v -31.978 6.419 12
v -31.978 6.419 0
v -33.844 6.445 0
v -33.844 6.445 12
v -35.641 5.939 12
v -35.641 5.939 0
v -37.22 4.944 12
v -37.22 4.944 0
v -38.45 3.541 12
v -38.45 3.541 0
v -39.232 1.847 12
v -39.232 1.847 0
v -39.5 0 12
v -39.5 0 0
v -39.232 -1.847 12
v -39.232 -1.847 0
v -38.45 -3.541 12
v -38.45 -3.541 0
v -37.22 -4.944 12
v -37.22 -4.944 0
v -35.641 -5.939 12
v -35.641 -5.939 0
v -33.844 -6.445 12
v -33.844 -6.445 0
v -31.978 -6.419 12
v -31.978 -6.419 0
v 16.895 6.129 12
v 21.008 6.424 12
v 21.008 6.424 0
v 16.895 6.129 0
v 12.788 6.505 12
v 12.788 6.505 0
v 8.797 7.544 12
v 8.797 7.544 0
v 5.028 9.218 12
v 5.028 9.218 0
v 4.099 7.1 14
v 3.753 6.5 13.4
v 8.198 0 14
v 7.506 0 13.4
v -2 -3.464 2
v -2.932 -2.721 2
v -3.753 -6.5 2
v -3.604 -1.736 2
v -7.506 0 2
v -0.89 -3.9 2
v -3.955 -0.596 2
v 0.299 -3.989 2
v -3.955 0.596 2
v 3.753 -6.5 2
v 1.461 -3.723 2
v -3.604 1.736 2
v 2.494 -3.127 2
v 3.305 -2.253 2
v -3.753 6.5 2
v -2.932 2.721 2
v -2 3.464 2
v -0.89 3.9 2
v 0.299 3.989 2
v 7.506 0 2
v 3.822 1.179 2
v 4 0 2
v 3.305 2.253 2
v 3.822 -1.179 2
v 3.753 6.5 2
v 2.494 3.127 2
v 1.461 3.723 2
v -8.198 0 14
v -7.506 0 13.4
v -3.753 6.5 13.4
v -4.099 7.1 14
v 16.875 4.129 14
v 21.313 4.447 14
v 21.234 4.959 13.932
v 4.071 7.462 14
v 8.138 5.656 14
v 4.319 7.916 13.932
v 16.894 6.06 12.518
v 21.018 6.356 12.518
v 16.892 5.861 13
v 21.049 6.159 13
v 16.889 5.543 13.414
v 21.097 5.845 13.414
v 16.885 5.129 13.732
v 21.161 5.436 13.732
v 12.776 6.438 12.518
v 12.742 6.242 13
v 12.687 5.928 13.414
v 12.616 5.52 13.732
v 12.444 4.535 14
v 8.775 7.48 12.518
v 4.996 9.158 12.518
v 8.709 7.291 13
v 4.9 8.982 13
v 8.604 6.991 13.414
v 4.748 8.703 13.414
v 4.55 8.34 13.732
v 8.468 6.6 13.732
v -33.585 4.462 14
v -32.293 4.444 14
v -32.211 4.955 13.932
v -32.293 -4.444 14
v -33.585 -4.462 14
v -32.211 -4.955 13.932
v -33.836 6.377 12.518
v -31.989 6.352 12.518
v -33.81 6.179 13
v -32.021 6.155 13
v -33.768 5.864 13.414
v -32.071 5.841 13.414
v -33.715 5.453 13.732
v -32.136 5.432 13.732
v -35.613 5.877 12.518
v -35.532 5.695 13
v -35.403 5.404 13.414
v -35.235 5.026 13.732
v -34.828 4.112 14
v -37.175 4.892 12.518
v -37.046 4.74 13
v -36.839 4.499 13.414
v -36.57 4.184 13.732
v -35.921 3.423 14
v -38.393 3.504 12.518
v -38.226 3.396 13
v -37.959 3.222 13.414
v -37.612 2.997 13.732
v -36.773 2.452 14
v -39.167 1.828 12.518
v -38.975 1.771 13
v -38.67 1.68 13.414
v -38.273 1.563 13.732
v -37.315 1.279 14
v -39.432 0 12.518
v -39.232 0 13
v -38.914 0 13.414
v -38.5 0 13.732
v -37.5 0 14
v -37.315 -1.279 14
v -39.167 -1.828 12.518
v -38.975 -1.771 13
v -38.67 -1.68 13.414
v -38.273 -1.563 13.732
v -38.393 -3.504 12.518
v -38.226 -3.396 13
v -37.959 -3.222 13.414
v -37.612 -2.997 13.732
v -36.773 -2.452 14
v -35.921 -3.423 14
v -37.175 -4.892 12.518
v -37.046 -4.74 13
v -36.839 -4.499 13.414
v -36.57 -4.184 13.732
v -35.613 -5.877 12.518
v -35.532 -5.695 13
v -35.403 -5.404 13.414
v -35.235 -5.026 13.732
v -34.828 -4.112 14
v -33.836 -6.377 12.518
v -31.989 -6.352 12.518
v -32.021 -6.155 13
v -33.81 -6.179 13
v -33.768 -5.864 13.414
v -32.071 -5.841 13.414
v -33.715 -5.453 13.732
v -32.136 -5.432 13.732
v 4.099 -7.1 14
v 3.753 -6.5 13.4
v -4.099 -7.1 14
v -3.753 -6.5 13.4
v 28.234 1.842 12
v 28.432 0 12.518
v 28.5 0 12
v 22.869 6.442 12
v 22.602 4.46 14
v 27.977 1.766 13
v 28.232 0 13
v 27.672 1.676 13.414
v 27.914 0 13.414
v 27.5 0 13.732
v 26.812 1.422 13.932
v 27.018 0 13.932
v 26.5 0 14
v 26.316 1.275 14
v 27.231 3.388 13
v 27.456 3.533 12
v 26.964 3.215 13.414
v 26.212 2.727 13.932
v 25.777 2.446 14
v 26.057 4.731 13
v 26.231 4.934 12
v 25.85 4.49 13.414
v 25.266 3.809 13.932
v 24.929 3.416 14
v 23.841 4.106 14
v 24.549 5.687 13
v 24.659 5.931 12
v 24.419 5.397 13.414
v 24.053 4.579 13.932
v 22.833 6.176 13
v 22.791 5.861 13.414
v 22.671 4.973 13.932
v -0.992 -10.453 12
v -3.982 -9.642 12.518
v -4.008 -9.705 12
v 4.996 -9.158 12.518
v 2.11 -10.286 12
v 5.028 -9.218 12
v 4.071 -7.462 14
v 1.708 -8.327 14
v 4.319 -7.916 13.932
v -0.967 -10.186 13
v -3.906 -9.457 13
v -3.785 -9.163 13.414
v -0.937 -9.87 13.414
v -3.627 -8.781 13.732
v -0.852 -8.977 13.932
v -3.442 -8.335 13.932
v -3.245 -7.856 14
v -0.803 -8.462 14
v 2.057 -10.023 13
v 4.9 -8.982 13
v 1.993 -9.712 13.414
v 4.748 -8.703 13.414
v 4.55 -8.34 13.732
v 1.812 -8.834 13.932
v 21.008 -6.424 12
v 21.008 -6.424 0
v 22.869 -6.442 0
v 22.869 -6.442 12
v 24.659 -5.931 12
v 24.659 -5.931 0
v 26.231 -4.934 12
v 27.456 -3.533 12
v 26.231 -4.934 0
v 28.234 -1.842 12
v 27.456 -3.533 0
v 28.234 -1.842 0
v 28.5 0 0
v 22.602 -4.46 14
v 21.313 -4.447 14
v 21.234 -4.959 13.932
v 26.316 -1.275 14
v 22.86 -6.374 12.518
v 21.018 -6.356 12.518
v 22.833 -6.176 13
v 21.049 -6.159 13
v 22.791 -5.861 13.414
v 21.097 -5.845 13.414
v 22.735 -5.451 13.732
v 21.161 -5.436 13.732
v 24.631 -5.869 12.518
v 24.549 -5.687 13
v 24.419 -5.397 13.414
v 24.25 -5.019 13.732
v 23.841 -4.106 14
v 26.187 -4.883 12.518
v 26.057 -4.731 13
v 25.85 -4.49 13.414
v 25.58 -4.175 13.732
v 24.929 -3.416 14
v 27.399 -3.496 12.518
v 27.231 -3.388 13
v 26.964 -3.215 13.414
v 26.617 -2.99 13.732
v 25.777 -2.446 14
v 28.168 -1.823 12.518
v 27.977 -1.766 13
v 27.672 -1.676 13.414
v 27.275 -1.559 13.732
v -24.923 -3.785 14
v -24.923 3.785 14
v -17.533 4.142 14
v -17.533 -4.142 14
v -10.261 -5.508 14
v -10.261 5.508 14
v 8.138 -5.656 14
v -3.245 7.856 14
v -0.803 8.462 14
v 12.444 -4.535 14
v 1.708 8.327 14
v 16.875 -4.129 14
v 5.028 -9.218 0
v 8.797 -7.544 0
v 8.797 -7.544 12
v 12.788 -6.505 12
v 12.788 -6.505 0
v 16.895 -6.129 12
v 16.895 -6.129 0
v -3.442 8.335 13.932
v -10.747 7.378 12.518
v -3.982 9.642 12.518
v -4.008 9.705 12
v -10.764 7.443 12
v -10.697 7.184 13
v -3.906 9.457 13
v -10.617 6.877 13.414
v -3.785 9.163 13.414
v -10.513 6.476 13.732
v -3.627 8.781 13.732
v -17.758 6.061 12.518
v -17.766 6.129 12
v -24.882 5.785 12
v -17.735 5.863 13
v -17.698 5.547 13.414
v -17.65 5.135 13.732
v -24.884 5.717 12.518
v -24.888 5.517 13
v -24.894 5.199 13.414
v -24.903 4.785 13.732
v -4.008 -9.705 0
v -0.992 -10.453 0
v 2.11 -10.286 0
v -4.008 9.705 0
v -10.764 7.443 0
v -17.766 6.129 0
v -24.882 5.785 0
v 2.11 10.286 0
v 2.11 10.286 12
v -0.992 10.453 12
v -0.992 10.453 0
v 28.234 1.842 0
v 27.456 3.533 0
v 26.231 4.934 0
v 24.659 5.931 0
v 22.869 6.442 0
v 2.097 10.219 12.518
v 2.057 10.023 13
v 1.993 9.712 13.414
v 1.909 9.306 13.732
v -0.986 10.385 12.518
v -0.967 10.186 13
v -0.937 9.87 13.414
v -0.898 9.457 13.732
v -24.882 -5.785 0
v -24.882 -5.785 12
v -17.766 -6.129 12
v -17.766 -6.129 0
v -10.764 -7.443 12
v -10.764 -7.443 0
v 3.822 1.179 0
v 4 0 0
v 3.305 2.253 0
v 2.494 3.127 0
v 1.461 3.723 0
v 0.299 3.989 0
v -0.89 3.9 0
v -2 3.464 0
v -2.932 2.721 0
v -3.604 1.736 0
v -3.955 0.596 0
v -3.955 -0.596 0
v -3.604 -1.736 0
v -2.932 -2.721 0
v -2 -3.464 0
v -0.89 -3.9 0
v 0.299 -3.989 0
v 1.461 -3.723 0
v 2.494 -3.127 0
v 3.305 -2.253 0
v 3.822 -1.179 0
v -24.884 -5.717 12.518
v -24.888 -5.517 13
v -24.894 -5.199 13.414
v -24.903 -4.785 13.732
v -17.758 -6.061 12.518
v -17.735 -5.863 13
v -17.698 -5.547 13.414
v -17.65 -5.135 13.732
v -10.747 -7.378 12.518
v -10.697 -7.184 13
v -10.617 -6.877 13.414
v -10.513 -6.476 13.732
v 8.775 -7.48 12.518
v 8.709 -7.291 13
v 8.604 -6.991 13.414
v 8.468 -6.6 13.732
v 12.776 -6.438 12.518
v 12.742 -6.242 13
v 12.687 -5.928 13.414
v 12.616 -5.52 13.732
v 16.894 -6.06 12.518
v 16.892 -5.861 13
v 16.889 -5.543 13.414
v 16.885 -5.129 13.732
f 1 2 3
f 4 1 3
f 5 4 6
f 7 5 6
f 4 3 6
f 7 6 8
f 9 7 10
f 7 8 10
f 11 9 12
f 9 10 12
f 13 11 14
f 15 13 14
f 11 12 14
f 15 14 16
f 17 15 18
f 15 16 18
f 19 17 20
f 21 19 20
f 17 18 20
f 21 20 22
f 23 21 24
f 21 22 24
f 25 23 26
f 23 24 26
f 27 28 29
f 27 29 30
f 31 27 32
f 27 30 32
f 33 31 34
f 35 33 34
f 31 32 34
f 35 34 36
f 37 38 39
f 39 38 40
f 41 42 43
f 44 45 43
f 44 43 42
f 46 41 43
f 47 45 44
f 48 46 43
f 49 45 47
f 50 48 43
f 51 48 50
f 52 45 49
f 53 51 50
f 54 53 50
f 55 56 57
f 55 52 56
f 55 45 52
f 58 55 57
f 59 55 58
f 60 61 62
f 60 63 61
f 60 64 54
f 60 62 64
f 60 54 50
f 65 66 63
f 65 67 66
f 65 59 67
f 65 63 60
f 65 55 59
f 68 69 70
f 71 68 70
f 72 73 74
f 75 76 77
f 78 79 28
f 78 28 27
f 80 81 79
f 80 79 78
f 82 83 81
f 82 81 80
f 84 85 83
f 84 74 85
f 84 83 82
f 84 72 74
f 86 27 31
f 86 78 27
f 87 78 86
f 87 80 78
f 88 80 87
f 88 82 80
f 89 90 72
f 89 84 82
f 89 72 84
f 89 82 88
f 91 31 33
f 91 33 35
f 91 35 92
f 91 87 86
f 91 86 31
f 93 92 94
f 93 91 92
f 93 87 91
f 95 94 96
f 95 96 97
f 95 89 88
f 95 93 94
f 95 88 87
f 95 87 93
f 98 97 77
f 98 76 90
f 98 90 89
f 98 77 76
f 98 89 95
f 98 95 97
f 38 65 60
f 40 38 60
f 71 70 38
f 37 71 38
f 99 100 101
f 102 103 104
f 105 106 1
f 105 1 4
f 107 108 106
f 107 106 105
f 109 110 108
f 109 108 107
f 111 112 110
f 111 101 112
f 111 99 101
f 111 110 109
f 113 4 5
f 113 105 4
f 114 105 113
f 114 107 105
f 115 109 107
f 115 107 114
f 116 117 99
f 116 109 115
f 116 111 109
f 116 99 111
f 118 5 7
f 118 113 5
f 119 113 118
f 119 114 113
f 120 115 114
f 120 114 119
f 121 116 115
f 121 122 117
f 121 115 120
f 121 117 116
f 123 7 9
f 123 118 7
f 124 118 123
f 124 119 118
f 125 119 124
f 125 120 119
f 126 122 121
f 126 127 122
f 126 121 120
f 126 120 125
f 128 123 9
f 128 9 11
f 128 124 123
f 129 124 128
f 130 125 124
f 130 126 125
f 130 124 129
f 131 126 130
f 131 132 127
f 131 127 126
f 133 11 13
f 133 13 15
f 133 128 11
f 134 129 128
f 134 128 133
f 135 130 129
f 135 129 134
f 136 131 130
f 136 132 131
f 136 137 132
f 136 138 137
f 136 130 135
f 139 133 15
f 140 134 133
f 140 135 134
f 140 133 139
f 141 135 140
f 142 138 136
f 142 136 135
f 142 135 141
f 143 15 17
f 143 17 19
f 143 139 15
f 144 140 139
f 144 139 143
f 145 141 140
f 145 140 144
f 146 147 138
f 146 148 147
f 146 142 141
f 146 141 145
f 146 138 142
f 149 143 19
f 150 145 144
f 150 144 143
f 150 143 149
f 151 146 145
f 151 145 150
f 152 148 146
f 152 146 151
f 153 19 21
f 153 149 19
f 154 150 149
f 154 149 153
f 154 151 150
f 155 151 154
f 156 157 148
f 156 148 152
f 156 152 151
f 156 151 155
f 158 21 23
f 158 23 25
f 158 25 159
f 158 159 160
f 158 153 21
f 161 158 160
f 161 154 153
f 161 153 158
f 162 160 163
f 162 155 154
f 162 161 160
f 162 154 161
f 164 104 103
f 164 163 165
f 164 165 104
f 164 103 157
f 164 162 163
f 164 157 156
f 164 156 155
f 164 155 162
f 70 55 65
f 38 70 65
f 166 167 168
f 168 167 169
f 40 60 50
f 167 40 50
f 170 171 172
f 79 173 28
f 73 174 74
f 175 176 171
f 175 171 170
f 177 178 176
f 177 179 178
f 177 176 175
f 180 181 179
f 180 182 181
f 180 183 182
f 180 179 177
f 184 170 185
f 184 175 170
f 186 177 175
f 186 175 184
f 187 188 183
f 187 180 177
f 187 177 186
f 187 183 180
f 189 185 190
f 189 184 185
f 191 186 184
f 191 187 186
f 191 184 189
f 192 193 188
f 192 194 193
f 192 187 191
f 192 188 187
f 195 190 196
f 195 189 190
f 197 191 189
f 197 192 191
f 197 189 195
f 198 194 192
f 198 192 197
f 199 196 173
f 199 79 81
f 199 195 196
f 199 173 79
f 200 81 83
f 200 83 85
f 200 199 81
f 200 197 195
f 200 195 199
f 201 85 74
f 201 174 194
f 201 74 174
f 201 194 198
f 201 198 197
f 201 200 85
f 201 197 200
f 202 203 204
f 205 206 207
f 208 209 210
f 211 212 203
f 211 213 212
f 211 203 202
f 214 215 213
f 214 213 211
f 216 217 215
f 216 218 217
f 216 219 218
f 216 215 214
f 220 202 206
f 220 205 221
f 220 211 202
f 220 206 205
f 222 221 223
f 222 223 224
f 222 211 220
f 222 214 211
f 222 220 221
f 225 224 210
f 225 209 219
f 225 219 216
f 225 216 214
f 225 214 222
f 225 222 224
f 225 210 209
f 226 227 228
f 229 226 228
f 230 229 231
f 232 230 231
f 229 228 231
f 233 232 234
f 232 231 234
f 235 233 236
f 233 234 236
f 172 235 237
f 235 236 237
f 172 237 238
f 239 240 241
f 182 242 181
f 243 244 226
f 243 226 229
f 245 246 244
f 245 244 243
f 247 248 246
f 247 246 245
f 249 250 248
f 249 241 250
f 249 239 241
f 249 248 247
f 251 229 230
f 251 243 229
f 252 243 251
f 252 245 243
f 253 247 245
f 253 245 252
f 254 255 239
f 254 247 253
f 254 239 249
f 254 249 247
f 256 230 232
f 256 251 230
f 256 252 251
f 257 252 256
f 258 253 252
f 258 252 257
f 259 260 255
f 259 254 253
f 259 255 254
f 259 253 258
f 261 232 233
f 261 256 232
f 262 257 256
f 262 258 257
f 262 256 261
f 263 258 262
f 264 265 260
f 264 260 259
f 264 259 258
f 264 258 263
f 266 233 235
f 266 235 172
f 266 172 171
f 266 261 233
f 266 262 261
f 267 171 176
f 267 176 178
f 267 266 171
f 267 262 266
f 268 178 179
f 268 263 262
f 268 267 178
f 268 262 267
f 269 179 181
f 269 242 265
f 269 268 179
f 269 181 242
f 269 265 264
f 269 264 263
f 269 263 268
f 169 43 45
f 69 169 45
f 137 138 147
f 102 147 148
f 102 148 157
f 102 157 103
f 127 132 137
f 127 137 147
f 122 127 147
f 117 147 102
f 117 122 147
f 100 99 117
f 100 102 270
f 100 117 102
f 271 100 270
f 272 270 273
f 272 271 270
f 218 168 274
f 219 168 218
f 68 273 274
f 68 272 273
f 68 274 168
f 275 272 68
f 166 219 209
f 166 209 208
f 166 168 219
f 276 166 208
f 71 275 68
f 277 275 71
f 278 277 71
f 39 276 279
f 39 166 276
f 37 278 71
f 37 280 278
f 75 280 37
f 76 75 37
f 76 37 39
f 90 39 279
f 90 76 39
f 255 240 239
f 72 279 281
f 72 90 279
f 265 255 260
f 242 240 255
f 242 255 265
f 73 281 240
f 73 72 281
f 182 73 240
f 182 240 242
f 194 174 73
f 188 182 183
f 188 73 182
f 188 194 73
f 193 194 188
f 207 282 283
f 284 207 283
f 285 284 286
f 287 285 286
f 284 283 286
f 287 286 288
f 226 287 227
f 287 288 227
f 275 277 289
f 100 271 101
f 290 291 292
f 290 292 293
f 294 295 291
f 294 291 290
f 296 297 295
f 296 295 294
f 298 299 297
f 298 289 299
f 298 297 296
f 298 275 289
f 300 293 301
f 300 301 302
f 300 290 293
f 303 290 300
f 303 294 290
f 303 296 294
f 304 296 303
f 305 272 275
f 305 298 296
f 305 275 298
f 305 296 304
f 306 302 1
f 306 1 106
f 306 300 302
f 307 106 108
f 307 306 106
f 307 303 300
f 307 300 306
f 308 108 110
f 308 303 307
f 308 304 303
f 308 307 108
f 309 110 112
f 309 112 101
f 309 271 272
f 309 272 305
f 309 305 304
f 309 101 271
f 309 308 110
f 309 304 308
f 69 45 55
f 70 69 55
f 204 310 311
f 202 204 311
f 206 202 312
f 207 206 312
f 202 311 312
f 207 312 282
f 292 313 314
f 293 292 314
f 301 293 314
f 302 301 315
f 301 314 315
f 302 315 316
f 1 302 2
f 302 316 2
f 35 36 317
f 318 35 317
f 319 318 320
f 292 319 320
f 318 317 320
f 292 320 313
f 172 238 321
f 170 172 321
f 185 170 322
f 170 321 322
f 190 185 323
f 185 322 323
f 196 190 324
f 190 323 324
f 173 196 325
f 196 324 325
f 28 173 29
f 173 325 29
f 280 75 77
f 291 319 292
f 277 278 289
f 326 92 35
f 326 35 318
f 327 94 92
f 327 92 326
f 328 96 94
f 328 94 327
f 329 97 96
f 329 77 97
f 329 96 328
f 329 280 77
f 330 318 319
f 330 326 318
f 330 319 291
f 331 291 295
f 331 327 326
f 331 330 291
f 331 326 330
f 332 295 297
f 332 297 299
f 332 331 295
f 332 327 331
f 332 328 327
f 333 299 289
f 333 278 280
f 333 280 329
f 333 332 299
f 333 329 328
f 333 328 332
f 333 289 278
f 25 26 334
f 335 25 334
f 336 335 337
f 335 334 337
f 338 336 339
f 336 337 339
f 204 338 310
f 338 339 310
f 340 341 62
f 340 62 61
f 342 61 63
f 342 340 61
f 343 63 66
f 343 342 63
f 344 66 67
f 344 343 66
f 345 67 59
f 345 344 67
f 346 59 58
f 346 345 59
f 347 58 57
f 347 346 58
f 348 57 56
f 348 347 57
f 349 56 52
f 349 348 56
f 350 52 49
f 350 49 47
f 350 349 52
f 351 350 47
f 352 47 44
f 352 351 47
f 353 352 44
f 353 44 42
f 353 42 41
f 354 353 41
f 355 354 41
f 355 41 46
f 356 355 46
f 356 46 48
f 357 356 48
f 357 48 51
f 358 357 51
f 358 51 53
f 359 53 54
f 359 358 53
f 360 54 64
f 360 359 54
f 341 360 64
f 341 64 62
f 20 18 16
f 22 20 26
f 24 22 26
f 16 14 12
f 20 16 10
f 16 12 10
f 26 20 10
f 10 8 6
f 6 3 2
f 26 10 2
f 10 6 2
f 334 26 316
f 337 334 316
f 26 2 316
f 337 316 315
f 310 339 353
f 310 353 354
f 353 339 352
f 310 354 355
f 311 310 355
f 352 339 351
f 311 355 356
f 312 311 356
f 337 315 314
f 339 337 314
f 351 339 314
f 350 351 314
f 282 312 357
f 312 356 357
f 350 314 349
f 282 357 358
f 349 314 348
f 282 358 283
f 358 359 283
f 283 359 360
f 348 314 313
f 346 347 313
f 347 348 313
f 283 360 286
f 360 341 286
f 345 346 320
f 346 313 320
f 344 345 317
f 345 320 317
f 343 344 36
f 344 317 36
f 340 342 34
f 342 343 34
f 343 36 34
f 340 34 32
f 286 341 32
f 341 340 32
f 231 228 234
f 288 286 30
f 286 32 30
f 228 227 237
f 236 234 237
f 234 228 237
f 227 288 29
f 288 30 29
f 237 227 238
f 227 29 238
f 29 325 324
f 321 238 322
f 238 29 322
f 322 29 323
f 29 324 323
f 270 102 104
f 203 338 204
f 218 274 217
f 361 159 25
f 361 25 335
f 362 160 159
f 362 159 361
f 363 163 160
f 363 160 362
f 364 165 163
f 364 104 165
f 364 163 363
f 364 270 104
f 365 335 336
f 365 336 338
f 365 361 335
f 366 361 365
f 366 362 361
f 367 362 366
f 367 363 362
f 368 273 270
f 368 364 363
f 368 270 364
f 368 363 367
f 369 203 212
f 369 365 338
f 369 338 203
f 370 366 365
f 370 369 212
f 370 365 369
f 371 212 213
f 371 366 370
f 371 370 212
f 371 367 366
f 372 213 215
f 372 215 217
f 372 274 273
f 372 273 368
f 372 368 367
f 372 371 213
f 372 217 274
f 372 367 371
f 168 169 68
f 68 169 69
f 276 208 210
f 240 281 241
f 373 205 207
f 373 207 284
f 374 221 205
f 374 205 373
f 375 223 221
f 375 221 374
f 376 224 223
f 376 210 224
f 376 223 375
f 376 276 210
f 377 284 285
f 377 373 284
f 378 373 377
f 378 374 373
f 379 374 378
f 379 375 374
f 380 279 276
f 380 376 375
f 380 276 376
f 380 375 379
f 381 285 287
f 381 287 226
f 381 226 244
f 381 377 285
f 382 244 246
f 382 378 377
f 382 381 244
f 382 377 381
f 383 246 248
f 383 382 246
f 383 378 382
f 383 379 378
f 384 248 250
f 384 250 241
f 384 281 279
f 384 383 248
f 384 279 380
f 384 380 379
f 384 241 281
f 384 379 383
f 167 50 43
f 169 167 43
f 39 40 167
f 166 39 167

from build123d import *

# Parameters (mm, degrees)
F1_DEPTH = 14
F0_R     = 4
F2_DEPTH = 2
F3_R     = 2
F4_SIZE  = 0.6


with BuildPart() as f1:
    # F0 (on Top) → F1 (new body)
    with BuildSketch(Plane.XY):
        with BuildLine():
            ThreePointArc((-31.978437, -6.419222), (-28.055803, -4.219588), (-26.5, 0))
            ThreePointArc((-26.5, 0), (-28.055803, 4.219588), (-31.978437, 6.419222))
            ThreePointArc((-31.978437, 6.419222), (-39.5, 0), (-31.978437, -6.419222))
        make_face()
        with BuildLine():
            ThreePointArc((-31.978437, 6.419222), (-28.055803, 4.219588), (-26.5, 0))
            ThreePointArc((-26.5, 0), (-28.055803, -4.219588), (-31.978437, -6.419222))
            ThreePointArc((-31.978437, -6.419222), (-17.766263, -6.128644), (-4.008308, -9.704817))
            ThreePointArc((-4.008308, -9.704817), (-10.5, 0), (-4.008308, 9.704817))
            ThreePointArc((-4.008308, 9.704817), (-17.766263, 6.128644), (-31.978437, 6.419222))
        make_face()
        with BuildLine():
            ThreePointArc((5.028446, 9.217632), (0.56525, 10.484774), (-4.008308, 9.704817))
            ThreePointArc((-4.008308, 9.704817), (-10.5, 0), (-4.008308, -9.704817))
            ThreePointArc((-4.008308, -9.704817), (0.56525, -10.484774), (5.028446, -9.217632))
            ThreePointArc((5.028446, -9.217632), (9.029083, -5.359632), (10.5, 0))
            ThreePointArc((10.5, 0), (9.029083, 5.359632), (5.028446, 9.217632))
        make_face()
        Polygon((3.752777, 6.5), (7.505553, 0), (3.752777, -6.5), (-3.752777, -6.5), (-7.505553, 0), (-3.752777, 6.5), align=None, mode=Mode.SUBTRACT)
        with BuildLine():
            ThreePointArc((21.007914, 6.423843), (12.788223, 6.505464), (5.028446, 9.217632))
            ThreePointArc((5.028446, 9.217632), (9.029083, 5.359632), (10.5, 0))
            ThreePointArc((10.5, 0), (9.029083, -5.359632), (5.028446, -9.217632))
            ThreePointArc((5.028446, -9.217632), (12.788223, -6.505464), (21.007914, -6.423843))
            ThreePointArc((21.007914, -6.423843), (15.5, 0), (21.007914, 6.423843))
        make_face()
        with BuildLine():
            ThreePointArc((28.5, 0), (26.230924, 4.934499), (21.007914, 6.423843))
            ThreePointArc((21.007914, 6.423843), (15.5, 0), (21.007914, -6.423843))
            ThreePointArc((21.007914, -6.423843), (26.230924, -4.934499), (28.5, 0))
        make_face()
    extrude(amount=F1_DEPTH)

    # F0 (on Top) → F2 (join)
    with BuildSketch(Plane.XY):
        Polygon((3.752777, -6.5), (7.505553, 0), (3.752777, 6.5), (-3.752777, 6.5), (-7.505553, 0), (-3.752777, -6.5), align=None)
        Circle(F0_R, mode=Mode.SUBTRACT)
    extrude(amount=F2_DEPTH)

    # F3
    f3_edges = [f1.edges().sort_by_distance(p)[0] for p in [
        (-17.766263, -6.128644, 14),
    ]]
    fillet(f3_edges, radius=F3_R)

    # F4
    f4_edges = [f1.edges().sort_by_distance(p)[0] for p in [
        (-5.629165, 3.25, 14),
        (0, 6.5, 14),
        (5.629165, 3.25, 14),
        (5.629165, -3.25, 14),
        (0, -6.5, 14),
        (-5.629165, -3.25, 14),
    ]]
    chamfer(f4_edges, length=F4_SIZE)


solid = f1.part
